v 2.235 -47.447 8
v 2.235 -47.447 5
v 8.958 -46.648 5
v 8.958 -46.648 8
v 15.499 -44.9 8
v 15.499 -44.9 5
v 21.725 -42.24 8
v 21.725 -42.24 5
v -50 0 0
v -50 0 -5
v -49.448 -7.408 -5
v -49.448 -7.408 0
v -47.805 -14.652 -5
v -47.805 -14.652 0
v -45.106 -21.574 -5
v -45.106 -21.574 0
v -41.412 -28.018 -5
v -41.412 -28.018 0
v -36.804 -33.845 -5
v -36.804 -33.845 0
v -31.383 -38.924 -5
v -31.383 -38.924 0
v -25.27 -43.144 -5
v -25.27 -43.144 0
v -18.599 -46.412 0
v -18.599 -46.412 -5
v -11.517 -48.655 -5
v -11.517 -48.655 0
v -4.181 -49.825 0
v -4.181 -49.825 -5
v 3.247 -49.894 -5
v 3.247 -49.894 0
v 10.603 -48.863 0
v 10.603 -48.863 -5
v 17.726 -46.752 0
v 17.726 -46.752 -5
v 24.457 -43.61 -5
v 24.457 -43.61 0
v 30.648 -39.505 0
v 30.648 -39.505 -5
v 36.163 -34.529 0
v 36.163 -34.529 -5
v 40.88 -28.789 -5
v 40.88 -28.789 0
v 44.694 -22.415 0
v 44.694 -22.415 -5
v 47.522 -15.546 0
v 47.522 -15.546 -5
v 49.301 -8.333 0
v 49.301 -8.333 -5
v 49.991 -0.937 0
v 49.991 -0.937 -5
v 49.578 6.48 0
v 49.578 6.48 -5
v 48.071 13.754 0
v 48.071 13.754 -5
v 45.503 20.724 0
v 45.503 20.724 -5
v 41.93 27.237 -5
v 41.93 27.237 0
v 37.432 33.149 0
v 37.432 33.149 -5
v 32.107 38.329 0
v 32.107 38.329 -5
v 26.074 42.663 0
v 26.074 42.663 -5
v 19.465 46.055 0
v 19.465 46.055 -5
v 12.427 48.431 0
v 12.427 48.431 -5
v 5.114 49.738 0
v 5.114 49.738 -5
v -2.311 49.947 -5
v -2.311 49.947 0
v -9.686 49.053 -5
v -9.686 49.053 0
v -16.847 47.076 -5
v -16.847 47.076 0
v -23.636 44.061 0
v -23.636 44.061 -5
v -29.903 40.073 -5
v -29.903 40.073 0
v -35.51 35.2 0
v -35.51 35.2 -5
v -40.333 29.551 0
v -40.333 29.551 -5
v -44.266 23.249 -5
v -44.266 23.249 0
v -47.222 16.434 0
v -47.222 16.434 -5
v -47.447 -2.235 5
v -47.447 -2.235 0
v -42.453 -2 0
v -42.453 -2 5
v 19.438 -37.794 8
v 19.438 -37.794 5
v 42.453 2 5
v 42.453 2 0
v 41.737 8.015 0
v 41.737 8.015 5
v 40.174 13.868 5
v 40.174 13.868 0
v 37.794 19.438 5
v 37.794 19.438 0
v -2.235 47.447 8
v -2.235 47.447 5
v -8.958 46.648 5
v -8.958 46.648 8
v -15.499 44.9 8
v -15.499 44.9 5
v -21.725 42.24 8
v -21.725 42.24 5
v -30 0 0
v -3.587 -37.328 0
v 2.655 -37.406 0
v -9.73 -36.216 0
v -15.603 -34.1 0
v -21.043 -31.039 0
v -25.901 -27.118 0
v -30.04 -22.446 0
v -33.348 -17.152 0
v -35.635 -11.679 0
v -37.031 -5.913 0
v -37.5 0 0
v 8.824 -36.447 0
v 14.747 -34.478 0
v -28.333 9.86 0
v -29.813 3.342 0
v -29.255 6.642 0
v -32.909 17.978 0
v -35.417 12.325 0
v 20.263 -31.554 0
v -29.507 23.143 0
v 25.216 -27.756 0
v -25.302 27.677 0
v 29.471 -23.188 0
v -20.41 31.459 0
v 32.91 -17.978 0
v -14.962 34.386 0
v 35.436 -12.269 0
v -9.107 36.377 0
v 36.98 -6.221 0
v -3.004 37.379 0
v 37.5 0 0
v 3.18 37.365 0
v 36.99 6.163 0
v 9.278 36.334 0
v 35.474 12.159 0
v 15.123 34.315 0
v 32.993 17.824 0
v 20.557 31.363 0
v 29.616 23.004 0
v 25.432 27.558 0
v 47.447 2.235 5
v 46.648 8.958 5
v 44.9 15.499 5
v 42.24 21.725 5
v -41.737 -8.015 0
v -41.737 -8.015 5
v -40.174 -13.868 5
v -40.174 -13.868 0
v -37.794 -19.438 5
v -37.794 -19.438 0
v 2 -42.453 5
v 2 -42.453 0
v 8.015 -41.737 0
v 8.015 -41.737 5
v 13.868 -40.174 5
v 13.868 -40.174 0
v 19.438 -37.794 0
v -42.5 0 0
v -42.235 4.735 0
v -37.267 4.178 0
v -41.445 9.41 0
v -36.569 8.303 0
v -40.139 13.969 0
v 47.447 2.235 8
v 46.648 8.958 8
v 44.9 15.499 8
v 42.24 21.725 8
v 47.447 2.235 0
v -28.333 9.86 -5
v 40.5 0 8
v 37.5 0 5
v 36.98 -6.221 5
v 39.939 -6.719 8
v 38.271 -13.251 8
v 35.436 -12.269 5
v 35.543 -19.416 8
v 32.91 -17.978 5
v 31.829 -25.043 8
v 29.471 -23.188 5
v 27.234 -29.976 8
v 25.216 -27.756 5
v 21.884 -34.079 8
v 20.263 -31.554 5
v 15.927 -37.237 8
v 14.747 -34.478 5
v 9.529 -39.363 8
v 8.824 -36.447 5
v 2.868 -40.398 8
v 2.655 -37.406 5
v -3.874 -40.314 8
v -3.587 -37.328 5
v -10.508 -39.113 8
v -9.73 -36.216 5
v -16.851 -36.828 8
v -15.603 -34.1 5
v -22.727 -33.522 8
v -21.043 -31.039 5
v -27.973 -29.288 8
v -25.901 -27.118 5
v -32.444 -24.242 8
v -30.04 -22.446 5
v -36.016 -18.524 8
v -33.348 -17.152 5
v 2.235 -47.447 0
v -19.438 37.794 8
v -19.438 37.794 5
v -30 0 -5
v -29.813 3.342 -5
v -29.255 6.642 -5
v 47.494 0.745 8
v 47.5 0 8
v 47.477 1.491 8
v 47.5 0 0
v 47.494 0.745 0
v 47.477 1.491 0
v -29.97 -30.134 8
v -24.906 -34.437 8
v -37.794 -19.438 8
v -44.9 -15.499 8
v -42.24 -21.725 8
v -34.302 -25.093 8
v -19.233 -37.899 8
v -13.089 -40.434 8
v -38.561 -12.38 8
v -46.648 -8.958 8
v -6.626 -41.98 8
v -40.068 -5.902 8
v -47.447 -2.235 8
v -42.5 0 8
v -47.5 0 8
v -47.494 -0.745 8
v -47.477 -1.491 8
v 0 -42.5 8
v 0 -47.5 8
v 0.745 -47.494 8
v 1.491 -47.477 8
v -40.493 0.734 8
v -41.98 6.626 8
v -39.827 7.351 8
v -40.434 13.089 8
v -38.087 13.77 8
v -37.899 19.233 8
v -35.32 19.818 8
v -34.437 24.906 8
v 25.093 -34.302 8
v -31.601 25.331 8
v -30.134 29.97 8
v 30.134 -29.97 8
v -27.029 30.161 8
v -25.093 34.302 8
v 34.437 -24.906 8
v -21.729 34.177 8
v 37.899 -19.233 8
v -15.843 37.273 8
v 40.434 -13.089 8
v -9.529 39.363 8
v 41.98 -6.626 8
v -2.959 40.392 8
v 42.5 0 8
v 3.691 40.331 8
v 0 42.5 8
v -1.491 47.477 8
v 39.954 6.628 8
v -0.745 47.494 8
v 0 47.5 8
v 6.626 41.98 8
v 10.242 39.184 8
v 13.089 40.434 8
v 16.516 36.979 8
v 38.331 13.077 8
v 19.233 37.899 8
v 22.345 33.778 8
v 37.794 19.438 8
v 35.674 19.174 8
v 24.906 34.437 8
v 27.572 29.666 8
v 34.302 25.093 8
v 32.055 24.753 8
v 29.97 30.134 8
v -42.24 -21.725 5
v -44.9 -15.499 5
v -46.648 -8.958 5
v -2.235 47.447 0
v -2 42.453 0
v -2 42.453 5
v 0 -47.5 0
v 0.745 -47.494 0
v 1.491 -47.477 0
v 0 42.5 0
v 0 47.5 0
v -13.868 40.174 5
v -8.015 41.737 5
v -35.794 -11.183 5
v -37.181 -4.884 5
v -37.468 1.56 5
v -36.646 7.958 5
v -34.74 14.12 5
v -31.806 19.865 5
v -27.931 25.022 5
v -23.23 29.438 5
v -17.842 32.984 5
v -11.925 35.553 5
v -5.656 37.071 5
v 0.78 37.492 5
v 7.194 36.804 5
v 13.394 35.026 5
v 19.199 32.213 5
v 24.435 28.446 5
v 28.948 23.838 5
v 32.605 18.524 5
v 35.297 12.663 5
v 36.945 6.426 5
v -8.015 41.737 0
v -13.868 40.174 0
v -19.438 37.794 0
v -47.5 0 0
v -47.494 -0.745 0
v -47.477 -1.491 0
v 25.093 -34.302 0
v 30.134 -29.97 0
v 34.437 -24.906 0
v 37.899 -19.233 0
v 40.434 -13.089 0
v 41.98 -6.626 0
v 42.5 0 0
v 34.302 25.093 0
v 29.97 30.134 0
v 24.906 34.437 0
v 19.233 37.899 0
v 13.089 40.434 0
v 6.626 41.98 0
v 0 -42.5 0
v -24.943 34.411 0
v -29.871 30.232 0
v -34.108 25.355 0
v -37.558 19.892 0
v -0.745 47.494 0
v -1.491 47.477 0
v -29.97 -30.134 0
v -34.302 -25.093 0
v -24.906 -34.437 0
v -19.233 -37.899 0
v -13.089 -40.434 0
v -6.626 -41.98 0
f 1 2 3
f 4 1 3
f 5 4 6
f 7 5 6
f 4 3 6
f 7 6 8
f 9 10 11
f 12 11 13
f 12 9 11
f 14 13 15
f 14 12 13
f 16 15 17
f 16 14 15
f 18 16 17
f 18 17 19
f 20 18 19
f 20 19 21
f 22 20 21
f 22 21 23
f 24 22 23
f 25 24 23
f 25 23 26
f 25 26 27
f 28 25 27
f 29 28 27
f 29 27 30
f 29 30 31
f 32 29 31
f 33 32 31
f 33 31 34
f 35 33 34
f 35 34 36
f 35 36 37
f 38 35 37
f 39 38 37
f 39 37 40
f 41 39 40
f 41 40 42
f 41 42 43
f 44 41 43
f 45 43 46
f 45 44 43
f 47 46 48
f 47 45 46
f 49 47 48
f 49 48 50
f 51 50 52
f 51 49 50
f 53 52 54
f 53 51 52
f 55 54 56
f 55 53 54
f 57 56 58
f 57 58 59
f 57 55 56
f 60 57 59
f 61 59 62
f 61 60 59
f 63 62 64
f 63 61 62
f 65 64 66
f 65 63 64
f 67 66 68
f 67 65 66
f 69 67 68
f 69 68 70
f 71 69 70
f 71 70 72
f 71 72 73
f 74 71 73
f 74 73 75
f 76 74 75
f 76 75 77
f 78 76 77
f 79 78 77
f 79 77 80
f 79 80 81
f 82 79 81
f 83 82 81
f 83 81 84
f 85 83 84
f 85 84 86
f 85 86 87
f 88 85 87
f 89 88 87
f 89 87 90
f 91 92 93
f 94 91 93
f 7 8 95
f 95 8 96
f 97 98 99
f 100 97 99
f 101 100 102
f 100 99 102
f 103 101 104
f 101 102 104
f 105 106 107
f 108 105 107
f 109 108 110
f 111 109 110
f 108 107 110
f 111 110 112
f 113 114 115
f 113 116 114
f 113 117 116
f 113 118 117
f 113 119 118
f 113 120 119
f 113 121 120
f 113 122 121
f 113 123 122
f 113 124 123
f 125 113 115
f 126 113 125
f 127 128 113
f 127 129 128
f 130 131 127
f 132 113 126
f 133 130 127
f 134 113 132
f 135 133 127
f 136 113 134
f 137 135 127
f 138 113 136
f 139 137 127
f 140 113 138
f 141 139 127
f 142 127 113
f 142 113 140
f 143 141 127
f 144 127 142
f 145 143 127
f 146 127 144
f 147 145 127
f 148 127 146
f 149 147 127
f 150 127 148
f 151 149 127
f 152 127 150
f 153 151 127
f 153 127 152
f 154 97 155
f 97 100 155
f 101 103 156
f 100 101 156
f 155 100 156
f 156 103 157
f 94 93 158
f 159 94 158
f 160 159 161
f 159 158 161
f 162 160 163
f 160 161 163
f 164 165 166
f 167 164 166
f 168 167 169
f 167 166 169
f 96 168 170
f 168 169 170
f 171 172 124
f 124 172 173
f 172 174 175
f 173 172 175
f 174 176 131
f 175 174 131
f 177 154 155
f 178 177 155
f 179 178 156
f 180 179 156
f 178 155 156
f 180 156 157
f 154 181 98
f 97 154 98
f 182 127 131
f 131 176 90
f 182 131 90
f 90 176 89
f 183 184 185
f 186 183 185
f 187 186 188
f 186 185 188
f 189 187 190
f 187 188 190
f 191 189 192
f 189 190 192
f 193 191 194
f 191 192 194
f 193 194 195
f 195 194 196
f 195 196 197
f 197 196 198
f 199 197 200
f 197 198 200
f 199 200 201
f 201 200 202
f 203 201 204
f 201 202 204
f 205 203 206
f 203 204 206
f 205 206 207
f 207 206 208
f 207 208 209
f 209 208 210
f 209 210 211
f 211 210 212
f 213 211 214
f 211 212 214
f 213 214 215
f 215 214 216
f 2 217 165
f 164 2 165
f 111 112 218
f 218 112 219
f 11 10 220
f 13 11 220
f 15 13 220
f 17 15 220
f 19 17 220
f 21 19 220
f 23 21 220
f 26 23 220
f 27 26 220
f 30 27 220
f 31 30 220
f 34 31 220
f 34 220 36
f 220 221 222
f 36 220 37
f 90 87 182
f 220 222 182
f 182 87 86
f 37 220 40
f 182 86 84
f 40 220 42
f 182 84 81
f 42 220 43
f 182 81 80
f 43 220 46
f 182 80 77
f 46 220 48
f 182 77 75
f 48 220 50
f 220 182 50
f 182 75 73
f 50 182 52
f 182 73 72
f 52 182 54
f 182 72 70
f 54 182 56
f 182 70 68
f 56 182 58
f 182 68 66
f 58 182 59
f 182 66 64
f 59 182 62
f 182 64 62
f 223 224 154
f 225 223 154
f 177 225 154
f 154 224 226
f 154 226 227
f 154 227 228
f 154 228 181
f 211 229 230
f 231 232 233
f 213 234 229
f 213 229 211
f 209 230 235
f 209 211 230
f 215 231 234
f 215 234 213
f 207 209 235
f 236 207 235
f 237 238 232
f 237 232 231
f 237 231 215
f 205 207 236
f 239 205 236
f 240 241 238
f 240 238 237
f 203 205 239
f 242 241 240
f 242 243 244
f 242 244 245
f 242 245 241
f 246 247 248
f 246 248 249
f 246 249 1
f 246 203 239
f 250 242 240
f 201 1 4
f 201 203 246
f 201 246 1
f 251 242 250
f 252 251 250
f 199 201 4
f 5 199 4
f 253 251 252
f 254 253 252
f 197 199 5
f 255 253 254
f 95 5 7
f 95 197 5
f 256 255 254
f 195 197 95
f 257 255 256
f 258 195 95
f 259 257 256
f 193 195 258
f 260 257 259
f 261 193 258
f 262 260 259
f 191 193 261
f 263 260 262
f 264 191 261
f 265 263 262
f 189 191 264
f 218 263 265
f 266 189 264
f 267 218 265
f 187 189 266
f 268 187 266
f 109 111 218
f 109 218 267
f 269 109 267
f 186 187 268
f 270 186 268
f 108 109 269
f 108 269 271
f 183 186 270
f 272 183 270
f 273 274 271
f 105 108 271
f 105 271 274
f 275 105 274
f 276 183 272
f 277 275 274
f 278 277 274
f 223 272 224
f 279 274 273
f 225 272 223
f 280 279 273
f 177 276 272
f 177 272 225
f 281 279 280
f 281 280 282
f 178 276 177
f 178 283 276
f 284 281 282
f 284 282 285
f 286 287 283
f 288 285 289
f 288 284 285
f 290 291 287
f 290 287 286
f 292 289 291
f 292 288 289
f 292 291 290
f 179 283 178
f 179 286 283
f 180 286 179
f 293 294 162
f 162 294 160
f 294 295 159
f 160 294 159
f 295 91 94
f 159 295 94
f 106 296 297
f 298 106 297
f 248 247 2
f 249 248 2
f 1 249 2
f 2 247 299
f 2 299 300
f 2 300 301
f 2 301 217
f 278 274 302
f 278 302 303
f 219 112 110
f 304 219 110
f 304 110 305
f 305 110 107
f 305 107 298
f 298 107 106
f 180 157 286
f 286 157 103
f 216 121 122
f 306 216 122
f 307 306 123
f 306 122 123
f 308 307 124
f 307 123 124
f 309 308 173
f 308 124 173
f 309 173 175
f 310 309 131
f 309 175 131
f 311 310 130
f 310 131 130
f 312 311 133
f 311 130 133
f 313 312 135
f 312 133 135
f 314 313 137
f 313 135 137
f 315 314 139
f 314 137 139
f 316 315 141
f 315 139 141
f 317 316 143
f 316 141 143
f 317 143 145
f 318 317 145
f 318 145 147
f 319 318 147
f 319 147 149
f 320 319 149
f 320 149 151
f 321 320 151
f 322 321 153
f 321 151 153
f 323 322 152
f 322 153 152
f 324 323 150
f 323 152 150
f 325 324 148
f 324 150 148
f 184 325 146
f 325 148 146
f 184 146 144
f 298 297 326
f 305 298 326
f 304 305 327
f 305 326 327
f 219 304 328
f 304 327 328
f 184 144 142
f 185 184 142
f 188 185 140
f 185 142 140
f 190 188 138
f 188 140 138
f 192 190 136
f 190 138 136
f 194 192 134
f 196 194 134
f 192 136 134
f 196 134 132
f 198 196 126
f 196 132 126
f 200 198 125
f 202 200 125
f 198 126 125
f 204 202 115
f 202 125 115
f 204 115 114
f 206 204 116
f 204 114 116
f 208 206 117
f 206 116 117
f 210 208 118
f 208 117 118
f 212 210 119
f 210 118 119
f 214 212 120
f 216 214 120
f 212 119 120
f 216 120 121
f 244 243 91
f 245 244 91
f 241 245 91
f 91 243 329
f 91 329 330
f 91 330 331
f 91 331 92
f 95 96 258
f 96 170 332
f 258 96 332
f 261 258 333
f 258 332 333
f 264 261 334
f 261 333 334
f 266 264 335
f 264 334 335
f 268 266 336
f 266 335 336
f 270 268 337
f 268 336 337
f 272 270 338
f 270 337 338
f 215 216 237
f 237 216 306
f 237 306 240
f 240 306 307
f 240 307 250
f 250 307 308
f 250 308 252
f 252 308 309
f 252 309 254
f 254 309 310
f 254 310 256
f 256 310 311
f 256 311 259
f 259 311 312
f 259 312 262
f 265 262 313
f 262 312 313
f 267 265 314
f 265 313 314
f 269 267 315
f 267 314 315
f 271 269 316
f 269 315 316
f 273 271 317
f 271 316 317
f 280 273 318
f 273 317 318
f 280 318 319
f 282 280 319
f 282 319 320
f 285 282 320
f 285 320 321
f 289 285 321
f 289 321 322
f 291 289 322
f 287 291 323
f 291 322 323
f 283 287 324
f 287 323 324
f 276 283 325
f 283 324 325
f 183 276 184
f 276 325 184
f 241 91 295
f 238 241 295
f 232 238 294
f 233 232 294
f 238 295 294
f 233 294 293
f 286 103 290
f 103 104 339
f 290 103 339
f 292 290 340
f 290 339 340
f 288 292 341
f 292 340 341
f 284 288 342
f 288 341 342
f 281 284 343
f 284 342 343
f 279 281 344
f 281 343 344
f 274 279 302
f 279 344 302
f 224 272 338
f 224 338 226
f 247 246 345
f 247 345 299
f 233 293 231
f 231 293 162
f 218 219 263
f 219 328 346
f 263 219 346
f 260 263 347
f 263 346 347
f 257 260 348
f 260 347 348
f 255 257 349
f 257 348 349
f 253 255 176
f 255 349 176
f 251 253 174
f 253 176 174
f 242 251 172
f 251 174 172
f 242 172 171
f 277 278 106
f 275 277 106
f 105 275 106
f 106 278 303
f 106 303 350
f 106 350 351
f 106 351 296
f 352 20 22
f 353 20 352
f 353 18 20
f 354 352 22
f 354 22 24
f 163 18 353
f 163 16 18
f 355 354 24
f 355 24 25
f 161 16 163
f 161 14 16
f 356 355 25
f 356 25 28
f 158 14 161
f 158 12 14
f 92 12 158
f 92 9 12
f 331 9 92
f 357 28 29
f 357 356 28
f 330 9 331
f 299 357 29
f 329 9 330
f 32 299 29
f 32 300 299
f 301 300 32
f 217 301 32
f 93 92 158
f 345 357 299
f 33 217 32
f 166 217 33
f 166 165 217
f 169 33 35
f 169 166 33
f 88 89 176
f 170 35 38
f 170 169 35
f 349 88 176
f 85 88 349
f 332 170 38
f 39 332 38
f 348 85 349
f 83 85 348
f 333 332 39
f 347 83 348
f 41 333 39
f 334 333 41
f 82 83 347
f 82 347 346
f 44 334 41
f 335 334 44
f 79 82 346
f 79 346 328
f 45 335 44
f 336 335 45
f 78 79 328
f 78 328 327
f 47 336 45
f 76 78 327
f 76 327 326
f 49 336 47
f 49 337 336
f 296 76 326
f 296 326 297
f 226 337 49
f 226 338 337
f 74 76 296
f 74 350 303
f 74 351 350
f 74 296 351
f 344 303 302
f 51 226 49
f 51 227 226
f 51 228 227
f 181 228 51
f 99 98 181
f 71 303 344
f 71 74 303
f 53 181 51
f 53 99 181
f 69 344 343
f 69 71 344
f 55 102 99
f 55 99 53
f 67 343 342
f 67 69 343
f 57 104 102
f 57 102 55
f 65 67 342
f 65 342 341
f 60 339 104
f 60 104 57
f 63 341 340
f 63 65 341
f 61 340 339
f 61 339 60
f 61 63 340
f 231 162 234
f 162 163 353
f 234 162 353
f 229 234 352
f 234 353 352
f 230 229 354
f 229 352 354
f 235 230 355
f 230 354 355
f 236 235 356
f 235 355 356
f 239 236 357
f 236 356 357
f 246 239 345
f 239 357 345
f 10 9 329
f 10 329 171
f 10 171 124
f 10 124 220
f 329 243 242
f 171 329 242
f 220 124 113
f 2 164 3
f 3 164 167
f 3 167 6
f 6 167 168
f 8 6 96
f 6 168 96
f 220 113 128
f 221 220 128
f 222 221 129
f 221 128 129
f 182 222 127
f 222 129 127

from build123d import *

# Parameters (mm, degrees)
F1_DEPTH = 8
F2_DEPTH = 8
F3_START = 5
F3_DEPTH = 3
F4_R     = 50
F5_DEPTH = 5
F7_DEPTH = 5
F8_SIZE  = 3


with BuildPart() as f1:
    # F0 (on Top) → F1 (new body)
    with BuildSketch(Plane.XY):
        with BuildLine():
            ThreePointArc((19.4384842845, -37.7941176471), (36.2793714257, -22.137235802), (42.5, 0))
            ThreePointArc((42.5, 0), (42.488227143, 1.0002770852), (42.4529150943, 2))
            ThreePointArc((42.4529150943, 2), (41.0599774657, 10.969423436), (37.7941176471, 19.4384842845))
            ThreePointArc((37.7941176471, 19.4384842845), (22.137235802, 36.2793714257), (0, 42.5))
            ThreePointArc((0, 42.5), (-1.0002770852, 42.488227143), (-2, 42.4529150943))
            ThreePointArc((-2, 42.4529150943), (-10.969423436, 41.0599774657), (-19.4384842845, 37.7941176471))
            ThreePointArc((-19.4384842845, 37.7941176471), (-36.2793714257, 22.137235802), (-42.5, 0))
            ThreePointArc((-42.5, 0), (-42.488227143, -1.0002770852), (-42.4529150943, -2))
            ThreePointArc((-42.4529150943, -2), (-41.0599774657, -10.969423436), (-37.7941176471, -19.4384842845))
            ThreePointArc((-37.7941176471, -19.4384842845), (-22.137235802, -36.2793714257), (0, -42.5))
            ThreePointArc((0, -42.5), (1.0002770852, -42.488227143), (2, -42.4529150943))
            ThreePointArc((2, -42.4529150943), (10.969423436, -41.0599774657), (19.4384842845, -37.7941176471))
        make_face()
        with BuildLine():
            ThreePointArc((37.5, 0), (8.8235294118, -36.4471580335), (-33.3477508651, -17.1516037805))
            ThreePointArc((-33.3477508651, -17.1516037805), (-8.8235294118, 36.4471580335), (37.5, 0))
        make_face(mode=Mode.SUBTRACT)
    extrude(amount=F1_DEPTH)

    # F0 (on Top) → F2 (join)
    with BuildSketch(Plane.XY):
        with BuildLine():
            ThreePointArc((-47.5, 0), (-47.486842101, -1.1179567422), (-47.4473756936, -2.2352941176))
            Line((-47.4473756936, -2.2352941176), (-42.4529150943, -2))
            ThreePointArc((-42.4529150943, -2), (-42.488227143, -1.0002770852), (-42.5, 0))
            Line((-42.5, 0), (-47.5, 0))
        make_face()
        with BuildLine():
            Line((0, 42.5), (0, 47.5))
            ThreePointArc((0, 47.5), (-1.1179567422, 47.486842101), (-2.2352941176, 47.4473756936))
            Line((-2.2352941176, 47.4473756936), (-2, 42.4529150943))
            ThreePointArc((-2, 42.4529150943), (-1.0002770852, 42.488227143), (0, 42.5))
        make_face()
        with BuildLine():
            Line((42.5, 0), (47.5, 0))
            ThreePointArc((47.5, 0), (47.486842101, 1.1179567422), (47.4473756936, 2.2352941176))
            Line((47.4473756936, 2.2352941176), (42.4529150943, 2))
            ThreePointArc((42.4529150943, 2), (42.488227143, 1.0002770852), (42.5, 0))
        make_face()
        with BuildLine():
            ThreePointArc((0, -47.5), (1.1179567422, -47.486842101), (2.2352941176, -47.4473756936))
            Line((2.2352941176, -47.4473756936), (2, -42.4529150943))
            ThreePointArc((2, -42.4529150943), (1.0002770852, -42.488227143), (0, -42.5))
            Line((0, -42.5), (0, -47.5))
        make_face()
    extrude(amount=F2_DEPTH)

    # F0 (on Top) → F3 (join)
    with BuildSketch(Plane.XY.offset(F3_START)):
        with BuildLine():
            ThreePointArc((-47.4473756936, -2.2352941176), (-45.8905630499, -12.2599438402), (-42.2404844291, -21.7253647886))
            Line((-42.2404844291, -21.7253647886), (-37.7941176471, -19.4384842845))
            ThreePointArc((-37.7941176471, -19.4384842845), (-41.0599774657, -10.969423436), (-42.4529150943, -2))
            Line((-42.4529150943, -2), (-47.4473756936, -2.2352941176))
        make_face()
        with BuildLine():
            ThreePointArc((2.2352941176, -47.4473756936), (12.2599438402, -45.8905630499), (21.7253647886, -42.2404844291))
            Line((21.7253647886, -42.2404844291), (19.4384842845, -37.7941176471))
            ThreePointArc((19.4384842845, -37.7941176471), (10.969423436, -41.0599774657), (2, -42.4529150943))
            Line((2, -42.4529150943), (2.2352941176, -47.4473756936))
        make_face()
        with BuildLine():
            Line((42.4529150943, 2), (47.4473756936, 2.2352941176))
            ThreePointArc((47.4473756936, 2.2352941176), (45.8905630499, 12.2599438402), (42.2404844291, 21.7253647886))
            Line((42.2404844291, 21.7253647886), (37.7941176471, 19.4384842845))
            ThreePointArc((37.7941176471, 19.4384842845), (41.0599774657, 10.969423436), (42.4529150943, 2))
        make_face()
        with BuildLine():
            Line((-2, 42.4529150943), (-2.2352941176, 47.4473756936))
            ThreePointArc((-2.2352941176, 47.4473756936), (-12.2599438402, 45.8905630499), (-21.7253647886, 42.2404844291))
            Line((-21.7253647886, 42.2404844291), (-19.4384842845, 37.7941176471))
            ThreePointArc((-19.4384842845, 37.7941176471), (-10.969423436, 41.0599774657), (-2, 42.4529150943))
        make_face()
    extrude(amount=F3_DEPTH)

    # F4 (on Top) → F5 (join)
    with BuildSketch(Plane.XY):
        Circle(F4_R)
    extrude(amount=-F5_DEPTH)

    # F6 (on Top) → F7 (cut)
    with BuildSketch(Plane.XY):
        with BuildLine():
            Line((-28.3333333333, 9.8601329718), (-47.2222222222, 16.4335549531))
            ThreePointArc((-47.2222222222, 16.4335549531), (-49.3006648592, 8.3333333333), (-50, 0))
            Line((-50, 0), (-30, 0))
            ThreePointArc((-30, 0), (-29.5803989155, 5), (-28.3333333333, 9.8601329718))
        make_face()
    extrude(amount=-F7_DEPTH, mode=Mode.SUBTRACT)

    # F8
    f8_edges = [f1.edges().sort_by_distance(p)[0] for p in [
        (-37.5, 0, 8),
    ]]
    chamfer(f8_edges, length=F8_SIZE)


solid = f1.part
